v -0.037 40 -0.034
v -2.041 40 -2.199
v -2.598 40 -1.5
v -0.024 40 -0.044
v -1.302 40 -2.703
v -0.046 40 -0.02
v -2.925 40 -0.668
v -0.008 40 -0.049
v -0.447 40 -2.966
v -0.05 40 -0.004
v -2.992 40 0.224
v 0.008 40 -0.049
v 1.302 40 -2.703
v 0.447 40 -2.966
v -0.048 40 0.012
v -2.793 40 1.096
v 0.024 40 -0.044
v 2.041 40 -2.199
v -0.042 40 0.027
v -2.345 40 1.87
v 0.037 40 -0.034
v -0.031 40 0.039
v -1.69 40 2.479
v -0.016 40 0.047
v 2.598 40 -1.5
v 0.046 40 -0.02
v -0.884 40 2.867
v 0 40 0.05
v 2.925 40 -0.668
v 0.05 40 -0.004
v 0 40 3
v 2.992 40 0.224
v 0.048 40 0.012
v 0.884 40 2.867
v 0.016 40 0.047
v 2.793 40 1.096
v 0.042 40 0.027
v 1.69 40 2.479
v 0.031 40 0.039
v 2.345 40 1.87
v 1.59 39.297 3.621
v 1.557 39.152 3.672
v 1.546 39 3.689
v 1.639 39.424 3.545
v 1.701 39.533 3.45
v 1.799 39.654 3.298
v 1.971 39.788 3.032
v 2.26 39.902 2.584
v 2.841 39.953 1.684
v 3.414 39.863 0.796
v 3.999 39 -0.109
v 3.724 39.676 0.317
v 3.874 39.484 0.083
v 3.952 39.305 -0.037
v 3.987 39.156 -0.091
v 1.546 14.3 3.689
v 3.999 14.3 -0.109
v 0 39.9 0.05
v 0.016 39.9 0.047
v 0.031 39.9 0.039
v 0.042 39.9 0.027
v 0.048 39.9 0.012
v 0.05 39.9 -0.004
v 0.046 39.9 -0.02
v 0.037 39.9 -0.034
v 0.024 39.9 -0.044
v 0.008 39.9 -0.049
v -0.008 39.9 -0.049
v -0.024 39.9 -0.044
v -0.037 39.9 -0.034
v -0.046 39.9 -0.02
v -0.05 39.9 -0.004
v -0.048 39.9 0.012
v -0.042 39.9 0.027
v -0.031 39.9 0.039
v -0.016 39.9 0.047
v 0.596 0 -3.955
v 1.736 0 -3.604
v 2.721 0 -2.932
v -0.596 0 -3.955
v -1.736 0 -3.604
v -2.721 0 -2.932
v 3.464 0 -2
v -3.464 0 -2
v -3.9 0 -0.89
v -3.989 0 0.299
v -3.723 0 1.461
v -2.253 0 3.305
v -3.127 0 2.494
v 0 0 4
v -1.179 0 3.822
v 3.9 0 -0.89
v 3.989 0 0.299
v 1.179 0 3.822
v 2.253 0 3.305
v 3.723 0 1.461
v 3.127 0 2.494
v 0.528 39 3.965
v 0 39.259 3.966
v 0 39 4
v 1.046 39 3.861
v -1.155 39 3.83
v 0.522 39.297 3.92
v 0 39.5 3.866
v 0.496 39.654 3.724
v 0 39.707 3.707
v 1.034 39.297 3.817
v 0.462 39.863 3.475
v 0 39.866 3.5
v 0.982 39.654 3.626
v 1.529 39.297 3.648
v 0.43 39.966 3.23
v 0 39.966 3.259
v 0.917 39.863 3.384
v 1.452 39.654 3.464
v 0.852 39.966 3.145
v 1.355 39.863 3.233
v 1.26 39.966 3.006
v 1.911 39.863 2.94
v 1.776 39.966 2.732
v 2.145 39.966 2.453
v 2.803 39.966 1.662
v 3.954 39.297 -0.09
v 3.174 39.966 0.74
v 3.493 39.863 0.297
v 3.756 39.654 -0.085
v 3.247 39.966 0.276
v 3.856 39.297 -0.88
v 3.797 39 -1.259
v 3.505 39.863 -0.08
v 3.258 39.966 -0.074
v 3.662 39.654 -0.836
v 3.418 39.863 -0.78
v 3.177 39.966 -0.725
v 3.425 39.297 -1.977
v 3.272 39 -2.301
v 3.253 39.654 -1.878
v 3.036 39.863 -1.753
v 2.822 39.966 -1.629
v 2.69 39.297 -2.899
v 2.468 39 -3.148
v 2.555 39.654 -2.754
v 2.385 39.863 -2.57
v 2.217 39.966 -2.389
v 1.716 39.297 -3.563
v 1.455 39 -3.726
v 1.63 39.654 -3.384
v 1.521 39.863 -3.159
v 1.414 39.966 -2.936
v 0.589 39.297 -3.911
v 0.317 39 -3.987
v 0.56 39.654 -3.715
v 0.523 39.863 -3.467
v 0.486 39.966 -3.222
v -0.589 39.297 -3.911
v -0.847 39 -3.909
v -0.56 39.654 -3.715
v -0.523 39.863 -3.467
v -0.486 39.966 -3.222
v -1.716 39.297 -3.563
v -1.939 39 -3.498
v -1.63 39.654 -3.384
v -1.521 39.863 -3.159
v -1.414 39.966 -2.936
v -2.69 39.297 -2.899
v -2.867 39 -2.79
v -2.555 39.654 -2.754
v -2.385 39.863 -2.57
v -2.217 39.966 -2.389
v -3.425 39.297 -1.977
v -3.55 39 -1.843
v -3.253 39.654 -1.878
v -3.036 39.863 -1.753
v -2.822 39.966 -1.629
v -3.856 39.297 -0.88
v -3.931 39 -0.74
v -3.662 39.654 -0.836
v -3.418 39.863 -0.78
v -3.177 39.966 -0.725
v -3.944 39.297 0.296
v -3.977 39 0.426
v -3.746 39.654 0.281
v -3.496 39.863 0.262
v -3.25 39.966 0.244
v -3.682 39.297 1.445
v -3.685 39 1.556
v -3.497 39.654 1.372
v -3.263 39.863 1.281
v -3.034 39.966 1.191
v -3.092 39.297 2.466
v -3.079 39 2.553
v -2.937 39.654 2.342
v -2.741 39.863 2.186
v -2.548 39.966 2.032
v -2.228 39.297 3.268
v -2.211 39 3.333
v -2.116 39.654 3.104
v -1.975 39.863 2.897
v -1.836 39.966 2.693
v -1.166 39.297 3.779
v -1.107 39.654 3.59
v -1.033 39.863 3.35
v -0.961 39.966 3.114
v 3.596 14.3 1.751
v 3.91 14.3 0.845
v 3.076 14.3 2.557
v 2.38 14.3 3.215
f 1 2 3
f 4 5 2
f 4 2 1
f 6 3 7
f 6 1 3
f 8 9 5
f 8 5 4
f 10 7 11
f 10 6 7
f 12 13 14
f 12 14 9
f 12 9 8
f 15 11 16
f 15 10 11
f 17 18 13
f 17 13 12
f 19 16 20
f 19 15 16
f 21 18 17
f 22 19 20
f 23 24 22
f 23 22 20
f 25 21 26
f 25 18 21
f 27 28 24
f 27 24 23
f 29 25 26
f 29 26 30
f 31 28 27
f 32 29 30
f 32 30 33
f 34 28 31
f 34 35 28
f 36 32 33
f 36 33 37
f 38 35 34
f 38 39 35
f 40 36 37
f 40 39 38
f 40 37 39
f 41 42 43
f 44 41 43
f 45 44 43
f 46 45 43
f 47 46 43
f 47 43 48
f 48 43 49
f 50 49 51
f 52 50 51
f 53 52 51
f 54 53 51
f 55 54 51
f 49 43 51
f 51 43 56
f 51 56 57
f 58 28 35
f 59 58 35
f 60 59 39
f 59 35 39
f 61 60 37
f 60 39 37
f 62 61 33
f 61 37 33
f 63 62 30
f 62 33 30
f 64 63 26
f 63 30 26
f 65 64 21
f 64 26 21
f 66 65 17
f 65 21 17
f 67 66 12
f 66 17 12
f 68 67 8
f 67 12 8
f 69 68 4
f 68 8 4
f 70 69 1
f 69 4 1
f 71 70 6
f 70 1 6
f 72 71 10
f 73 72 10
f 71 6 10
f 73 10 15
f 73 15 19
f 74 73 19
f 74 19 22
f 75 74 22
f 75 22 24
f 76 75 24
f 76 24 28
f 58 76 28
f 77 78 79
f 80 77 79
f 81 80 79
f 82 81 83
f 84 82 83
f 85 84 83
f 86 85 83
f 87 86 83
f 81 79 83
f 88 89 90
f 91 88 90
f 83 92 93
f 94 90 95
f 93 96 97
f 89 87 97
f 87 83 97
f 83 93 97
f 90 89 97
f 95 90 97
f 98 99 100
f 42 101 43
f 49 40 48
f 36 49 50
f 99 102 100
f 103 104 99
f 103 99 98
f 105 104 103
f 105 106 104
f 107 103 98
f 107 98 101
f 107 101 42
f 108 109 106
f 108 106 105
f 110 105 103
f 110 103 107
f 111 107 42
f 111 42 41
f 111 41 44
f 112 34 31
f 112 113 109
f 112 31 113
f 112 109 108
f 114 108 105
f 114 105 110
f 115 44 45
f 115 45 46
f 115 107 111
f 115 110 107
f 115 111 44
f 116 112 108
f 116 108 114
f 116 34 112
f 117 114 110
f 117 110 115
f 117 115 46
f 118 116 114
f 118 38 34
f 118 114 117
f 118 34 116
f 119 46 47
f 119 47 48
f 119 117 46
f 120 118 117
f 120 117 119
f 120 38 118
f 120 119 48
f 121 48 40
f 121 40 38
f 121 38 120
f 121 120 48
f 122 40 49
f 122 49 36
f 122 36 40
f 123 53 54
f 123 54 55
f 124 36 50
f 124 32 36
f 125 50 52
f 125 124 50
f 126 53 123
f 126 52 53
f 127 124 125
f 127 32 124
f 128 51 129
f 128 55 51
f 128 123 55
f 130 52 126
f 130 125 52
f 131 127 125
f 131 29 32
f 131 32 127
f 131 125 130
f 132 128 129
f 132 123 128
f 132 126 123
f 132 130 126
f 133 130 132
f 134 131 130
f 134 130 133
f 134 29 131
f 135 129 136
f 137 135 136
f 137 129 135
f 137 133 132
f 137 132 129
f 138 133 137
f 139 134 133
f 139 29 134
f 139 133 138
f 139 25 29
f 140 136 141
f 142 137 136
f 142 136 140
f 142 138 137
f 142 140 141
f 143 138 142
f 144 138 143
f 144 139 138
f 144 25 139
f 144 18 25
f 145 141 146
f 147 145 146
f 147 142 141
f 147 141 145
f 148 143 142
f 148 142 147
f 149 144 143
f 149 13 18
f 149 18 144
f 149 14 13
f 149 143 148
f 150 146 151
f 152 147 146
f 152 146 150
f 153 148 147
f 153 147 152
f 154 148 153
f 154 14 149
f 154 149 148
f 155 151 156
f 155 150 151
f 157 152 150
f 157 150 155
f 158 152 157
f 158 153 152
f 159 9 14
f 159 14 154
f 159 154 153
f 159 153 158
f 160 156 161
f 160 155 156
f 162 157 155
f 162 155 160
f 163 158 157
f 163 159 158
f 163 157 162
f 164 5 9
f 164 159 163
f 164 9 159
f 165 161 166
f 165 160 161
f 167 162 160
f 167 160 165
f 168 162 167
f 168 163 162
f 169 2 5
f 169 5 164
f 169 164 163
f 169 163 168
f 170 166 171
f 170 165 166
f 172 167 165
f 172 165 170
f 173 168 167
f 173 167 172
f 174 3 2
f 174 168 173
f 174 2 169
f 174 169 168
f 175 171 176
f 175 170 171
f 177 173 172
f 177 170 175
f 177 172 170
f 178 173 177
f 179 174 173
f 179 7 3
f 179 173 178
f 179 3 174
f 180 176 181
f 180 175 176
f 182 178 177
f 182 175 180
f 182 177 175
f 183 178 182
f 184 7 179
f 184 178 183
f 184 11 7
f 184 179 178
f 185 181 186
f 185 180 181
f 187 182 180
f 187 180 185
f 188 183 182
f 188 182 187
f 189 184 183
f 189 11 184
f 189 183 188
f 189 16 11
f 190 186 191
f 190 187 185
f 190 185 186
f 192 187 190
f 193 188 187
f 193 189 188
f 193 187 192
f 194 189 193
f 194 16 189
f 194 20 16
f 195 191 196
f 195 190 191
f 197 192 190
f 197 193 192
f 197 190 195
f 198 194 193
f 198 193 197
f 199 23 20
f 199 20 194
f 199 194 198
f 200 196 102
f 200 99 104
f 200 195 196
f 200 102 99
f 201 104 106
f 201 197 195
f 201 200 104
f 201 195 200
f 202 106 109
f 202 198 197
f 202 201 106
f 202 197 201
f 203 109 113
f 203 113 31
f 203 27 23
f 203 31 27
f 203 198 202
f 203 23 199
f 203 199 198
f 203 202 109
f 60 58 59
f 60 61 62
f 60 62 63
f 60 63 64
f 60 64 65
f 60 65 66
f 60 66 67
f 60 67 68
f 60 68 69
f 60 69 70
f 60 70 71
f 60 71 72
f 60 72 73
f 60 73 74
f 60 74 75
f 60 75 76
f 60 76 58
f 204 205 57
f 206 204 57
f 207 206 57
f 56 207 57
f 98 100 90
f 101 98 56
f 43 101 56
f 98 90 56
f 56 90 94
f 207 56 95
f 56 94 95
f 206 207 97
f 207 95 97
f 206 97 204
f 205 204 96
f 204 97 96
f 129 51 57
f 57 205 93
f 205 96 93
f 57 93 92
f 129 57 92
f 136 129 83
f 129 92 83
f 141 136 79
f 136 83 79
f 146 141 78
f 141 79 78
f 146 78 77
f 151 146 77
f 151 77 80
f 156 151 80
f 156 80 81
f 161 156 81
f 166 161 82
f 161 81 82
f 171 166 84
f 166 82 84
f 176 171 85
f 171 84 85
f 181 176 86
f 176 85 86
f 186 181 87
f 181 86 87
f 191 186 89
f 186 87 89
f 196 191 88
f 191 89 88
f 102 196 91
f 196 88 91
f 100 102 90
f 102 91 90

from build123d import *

# Parameters (mm, degrees)
SKETCH1_R           = 4
BOSS_EXTRUDE1_DEPTH = 40
FILLET1_R           = 1
CUT_EXTRUDE1_START  = -25.7
CUT_EXTRUDE1_DEPTH  = 25.7
SKETCH3_R           = 0.05
CUT_EXTRUDE2_DEPTH  = 0.1


with BuildPart() as part:
    # Sketch1 → Boss-Extrude1 (new body)
    with BuildSketch(Plane(origin=(0, 0, 0), x_dir=(1, 0, 0), z_dir=(0, 1, 0))):
        with Locations(Location((0, 0, 0), (0, 0, 270))):
            Circle(SKETCH1_R)
    extrude(amount=BOSS_EXTRUDE1_DEPTH)

    # Fillet1
    fillet1_edges = [part.edges().sort_by_distance(p)[0] for p in [
        (0, 40, -4),
    ]]
    fillet(fillet1_edges, radius=FILLET1_R)

    # Sketch2 → Cut-Extrude1 (cut)
    with BuildSketch(Plane(origin=(0, 40, 0), x_dir=(1, 0, 0), z_dir=(0, 1, 0)).offset(CUT_EXTRUDE1_START)):
        with BuildLine():
            Line((1.546188852, -3.68907848), (3.998512047, 0.109093573))
            ThreePointArc((3.998512047, 0.109093573), (3.360424787, -2.169687823), (1.546188852, -3.68907848))
        make_face()
    extrude(amount=CUT_EXTRUDE1_DEPTH, mode=Mode.SUBTRACT)

    # Sketch3 → Cut-Extrude2 (cut)
    with BuildSketch(Plane(origin=(0, 40, 0), x_dir=(1, 0, 0), z_dir=(0, 1, 0))):
        with Locations(Location((0, 0, 0), (0, 0, 270))):
            Circle(SKETCH3_R)
    extrude(amount=-CUT_EXTRUDE2_DEPTH, mode=Mode.SUBTRACT)


solid = part.part
